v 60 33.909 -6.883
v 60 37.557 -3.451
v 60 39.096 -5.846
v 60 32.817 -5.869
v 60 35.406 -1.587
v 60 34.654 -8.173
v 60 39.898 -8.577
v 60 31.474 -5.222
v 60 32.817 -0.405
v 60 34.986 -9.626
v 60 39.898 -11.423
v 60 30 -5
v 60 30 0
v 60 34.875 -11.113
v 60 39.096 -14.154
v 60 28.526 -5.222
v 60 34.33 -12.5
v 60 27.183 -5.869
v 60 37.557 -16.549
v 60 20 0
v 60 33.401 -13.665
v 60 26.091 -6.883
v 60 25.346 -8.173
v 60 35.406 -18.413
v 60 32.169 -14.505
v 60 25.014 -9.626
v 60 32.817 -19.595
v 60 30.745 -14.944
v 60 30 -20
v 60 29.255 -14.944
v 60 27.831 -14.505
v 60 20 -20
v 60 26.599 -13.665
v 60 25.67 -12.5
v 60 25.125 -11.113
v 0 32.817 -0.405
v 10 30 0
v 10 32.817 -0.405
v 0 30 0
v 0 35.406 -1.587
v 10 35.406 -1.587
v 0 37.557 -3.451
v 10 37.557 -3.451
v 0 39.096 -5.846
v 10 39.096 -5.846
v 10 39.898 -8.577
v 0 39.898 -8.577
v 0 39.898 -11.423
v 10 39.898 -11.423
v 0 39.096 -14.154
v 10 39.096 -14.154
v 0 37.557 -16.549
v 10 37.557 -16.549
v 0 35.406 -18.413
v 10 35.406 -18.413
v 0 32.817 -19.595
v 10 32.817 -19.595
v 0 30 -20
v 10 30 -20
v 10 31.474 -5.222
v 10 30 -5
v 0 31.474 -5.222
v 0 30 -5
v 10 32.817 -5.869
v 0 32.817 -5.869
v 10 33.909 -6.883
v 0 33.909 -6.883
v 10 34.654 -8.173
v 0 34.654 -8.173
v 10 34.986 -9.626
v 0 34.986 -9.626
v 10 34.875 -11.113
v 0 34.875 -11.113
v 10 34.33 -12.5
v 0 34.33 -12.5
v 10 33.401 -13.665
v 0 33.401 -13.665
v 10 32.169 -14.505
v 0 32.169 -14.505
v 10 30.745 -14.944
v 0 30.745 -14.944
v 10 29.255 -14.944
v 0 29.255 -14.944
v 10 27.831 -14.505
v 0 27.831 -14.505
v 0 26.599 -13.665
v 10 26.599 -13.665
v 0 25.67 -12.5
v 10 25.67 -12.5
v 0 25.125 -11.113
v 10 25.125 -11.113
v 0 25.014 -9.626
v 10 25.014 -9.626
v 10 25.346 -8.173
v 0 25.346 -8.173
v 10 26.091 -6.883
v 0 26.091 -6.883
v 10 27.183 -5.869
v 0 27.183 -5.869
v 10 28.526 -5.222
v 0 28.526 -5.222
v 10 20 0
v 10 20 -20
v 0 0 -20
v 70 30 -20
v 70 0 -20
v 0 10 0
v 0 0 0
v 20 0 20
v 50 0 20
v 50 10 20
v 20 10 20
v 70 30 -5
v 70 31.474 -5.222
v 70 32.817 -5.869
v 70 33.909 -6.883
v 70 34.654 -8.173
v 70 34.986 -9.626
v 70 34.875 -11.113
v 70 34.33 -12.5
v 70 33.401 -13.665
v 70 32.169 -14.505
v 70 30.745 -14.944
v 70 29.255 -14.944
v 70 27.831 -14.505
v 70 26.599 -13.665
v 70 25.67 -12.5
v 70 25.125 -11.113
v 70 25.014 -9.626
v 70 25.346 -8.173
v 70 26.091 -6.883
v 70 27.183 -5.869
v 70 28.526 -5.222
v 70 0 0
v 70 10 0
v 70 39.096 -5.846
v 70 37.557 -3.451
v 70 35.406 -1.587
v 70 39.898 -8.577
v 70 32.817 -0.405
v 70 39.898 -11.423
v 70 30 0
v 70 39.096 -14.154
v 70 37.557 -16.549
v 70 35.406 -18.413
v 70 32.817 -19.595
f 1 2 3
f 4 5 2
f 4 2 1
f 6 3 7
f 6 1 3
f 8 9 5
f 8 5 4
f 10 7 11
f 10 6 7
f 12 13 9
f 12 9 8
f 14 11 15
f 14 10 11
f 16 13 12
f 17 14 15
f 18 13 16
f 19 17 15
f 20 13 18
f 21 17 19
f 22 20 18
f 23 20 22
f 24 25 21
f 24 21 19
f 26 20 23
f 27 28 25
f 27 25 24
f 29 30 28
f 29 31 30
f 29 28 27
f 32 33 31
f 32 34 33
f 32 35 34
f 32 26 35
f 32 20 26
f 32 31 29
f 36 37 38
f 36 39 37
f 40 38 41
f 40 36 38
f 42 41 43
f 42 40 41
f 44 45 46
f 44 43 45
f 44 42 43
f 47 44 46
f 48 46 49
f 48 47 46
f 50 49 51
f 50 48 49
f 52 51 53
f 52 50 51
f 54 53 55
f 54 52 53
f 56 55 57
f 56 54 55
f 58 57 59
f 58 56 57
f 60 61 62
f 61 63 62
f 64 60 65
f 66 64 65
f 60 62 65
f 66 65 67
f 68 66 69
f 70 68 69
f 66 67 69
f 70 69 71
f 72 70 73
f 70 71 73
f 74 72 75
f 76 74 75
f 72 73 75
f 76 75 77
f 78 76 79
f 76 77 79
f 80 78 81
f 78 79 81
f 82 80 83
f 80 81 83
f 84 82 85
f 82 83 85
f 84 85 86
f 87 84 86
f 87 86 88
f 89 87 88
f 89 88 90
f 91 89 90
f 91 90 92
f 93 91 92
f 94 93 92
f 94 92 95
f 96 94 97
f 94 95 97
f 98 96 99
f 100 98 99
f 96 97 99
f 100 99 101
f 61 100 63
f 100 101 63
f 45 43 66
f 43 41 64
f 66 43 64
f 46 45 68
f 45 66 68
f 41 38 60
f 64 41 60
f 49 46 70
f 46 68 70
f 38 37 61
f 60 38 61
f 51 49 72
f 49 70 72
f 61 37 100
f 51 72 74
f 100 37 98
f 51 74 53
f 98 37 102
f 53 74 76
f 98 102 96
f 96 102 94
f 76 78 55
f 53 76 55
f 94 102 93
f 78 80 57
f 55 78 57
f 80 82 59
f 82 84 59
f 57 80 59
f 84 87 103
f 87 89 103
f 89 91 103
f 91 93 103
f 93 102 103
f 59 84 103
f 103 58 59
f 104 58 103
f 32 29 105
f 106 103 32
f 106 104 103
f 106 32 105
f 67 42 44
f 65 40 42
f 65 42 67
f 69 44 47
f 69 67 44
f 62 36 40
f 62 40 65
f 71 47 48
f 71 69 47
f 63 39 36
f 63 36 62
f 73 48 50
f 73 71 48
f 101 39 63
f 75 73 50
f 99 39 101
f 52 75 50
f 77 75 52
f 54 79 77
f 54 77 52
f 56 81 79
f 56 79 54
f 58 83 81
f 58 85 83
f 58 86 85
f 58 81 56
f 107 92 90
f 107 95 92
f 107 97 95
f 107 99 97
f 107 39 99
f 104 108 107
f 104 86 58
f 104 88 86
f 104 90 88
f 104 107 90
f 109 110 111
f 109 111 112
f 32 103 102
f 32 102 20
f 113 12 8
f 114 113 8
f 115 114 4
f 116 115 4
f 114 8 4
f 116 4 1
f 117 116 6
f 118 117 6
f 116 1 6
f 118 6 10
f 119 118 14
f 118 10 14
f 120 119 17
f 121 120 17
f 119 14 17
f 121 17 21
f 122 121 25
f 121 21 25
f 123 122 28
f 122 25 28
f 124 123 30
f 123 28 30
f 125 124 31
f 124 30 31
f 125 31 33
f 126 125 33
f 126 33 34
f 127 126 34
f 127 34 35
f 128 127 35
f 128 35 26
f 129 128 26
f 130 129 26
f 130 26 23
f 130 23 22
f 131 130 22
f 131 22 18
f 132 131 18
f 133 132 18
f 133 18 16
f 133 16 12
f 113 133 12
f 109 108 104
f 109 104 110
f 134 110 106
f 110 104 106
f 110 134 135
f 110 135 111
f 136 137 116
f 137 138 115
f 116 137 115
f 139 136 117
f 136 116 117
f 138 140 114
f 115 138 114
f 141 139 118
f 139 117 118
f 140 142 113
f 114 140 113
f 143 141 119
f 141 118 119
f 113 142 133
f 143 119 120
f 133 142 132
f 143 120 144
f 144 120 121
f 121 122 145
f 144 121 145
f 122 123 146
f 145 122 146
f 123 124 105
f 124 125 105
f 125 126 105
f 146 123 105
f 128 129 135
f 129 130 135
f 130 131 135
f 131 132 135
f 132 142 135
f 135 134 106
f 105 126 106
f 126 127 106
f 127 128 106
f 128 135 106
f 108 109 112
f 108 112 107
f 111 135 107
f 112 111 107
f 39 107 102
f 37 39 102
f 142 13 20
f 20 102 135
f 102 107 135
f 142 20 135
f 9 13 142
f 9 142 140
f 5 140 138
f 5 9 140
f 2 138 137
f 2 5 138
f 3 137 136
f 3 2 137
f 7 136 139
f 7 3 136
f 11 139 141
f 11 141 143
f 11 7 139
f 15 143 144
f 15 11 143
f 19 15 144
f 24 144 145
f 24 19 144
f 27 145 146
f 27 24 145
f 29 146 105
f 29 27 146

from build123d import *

# Parameters (mm, degrees)
BOSS_EXTRUDE1_DEPTH = 10
SKETCH1_3_W         = 50
SKETCH1_3_H         = 20
BOSS_EXTRUDE2_DEPTH = 20
SKETCH1_4_W         = 10
SKETCH1_4_H         = 20
BOSS_EXTRUDE3_DEPTH = 40
FILLET1_RADIUS      = 10
FILLET1_LENGTH      = 10
FILLET2_RADIUS      = 10
FILLET2_LENGTH      = 10
CUT_EXTRUDE1_REACH  = 76.833
SKETCH2_R           = 5
CUT_EXTRUDE2_START  = 60
SKETCH2_2_R         = 5
CUT_EXTRUDE2_DEPTH  = 70


with BuildPart() as part:
    # Sketch1 → Boss-Extrude1 (new body)
    with BuildSketch(Plane(origin=(0, 0, 0), x_dir=(1, 0, 0), z_dir=(0, 1, 0))):
        Polygon((20, -20), (0, 0), (70, 0), (50, -20), align=None)
    extrude(amount=BOSS_EXTRUDE1_DEPTH)

    # Sketch1<3> → Boss-Extrude2 (add)
    with BuildSketch(Plane(origin=(0, 0, 0), x_dir=(1, 0, 0), z_dir=(0, 1, 0))):
        with Locations((35, 10)):
            Rectangle(SKETCH1_3_W, SKETCH1_3_H)
    extrude(amount=BOSS_EXTRUDE2_DEPTH)

    # Sketch1<4> → Boss-Extrude3 (add)
    with BuildSketch(Plane(origin=(0, 0, 0), x_dir=(1, 0, 0), z_dir=(0, 1, 0))):
        with Locations((65, 10)):
            Rectangle(SKETCH1_4_W, SKETCH1_4_H)
        with Locations((5, 10)):
            Rectangle(SKETCH1_4_W, SKETCH1_4_H)
    extrude(amount=BOSS_EXTRUDE3_DEPTH)

    # Fillet1: full round fillet: the end face becomes a half cylinder, R = half its width
    fillet1_face = Plane((65, 40, -10), x_dir=(-1, 0, 0), z_dir=(0, 1, 0))  # on the end face: x along it, z out of the body
    fillet1_slab = fillet1_face.offset(-FILLET1_RADIUS / 2) * Box(FILLET1_LENGTH, 2 * FILLET1_RADIUS, FILLET1_RADIUS, mode=Mode.PRIVATE)  # the body's end, R deep
    fillet1_round = Plane((65, 30, -10), x_dir=(0, 1, 0), z_dir=(-1, 0, 0)) * Cylinder(FILLET1_RADIUS, FILLET1_LENGTH, mode=Mode.PRIVATE)  # its axis R under the face
    add(fillet1_slab - fillet1_round, mode=Mode.SUBTRACT)

    # Fillet2: full round fillet: the end face becomes a half cylinder, R = half its width
    fillet2_face = Plane((5, 40, -10), x_dir=(-1, 0, 0), z_dir=(0, 1, 0))  # on the end face: x along it, z out of the body
    fillet2_slab = fillet2_face.offset(-FILLET2_RADIUS / 2) * Box(FILLET2_LENGTH, 2 * FILLET2_RADIUS, FILLET2_RADIUS, mode=Mode.PRIVATE)  # the body's end, R deep
    fillet2_round = Plane((5, 30, -10), x_dir=(0, 1, 0), z_dir=(-1, 0, 0)) * Cylinder(FILLET2_RADIUS, FILLET2_LENGTH, mode=Mode.PRIVATE)  # its axis R under the face
    add(fillet2_slab - fillet2_round, mode=Mode.SUBTRACT)

    # Sketch2 → Cut-Extrude1 (cut, up to next)
    with BuildSketch(Plane.ZY.offset(-60), mode=Mode.PRIVATE) as cut_extrude1_sk1:
        with Locations((-10, 30)):
            Circle(SKETCH2_R)
    cut_extrude1_tool1 = extrude(cut_extrude1_sk1.sketch, amount=-CUT_EXTRUDE1_REACH, mode=Mode.PRIVATE) & part.part
    add(cut_extrude1_tool1.solids().sort_by_distance((60, 30, -10))[0], mode=Mode.SUBTRACT)

    # Sketch2<2> → Cut-Extrude2 (cut)
    with BuildSketch(Plane.ZY.offset(-60).offset(CUT_EXTRUDE2_START)):
        with Locations((-10, 30)):
            Circle(SKETCH2_2_R)
    extrude(amount=-CUT_EXTRUDE2_DEPTH, mode=Mode.SUBTRACT)


solid = part.part
